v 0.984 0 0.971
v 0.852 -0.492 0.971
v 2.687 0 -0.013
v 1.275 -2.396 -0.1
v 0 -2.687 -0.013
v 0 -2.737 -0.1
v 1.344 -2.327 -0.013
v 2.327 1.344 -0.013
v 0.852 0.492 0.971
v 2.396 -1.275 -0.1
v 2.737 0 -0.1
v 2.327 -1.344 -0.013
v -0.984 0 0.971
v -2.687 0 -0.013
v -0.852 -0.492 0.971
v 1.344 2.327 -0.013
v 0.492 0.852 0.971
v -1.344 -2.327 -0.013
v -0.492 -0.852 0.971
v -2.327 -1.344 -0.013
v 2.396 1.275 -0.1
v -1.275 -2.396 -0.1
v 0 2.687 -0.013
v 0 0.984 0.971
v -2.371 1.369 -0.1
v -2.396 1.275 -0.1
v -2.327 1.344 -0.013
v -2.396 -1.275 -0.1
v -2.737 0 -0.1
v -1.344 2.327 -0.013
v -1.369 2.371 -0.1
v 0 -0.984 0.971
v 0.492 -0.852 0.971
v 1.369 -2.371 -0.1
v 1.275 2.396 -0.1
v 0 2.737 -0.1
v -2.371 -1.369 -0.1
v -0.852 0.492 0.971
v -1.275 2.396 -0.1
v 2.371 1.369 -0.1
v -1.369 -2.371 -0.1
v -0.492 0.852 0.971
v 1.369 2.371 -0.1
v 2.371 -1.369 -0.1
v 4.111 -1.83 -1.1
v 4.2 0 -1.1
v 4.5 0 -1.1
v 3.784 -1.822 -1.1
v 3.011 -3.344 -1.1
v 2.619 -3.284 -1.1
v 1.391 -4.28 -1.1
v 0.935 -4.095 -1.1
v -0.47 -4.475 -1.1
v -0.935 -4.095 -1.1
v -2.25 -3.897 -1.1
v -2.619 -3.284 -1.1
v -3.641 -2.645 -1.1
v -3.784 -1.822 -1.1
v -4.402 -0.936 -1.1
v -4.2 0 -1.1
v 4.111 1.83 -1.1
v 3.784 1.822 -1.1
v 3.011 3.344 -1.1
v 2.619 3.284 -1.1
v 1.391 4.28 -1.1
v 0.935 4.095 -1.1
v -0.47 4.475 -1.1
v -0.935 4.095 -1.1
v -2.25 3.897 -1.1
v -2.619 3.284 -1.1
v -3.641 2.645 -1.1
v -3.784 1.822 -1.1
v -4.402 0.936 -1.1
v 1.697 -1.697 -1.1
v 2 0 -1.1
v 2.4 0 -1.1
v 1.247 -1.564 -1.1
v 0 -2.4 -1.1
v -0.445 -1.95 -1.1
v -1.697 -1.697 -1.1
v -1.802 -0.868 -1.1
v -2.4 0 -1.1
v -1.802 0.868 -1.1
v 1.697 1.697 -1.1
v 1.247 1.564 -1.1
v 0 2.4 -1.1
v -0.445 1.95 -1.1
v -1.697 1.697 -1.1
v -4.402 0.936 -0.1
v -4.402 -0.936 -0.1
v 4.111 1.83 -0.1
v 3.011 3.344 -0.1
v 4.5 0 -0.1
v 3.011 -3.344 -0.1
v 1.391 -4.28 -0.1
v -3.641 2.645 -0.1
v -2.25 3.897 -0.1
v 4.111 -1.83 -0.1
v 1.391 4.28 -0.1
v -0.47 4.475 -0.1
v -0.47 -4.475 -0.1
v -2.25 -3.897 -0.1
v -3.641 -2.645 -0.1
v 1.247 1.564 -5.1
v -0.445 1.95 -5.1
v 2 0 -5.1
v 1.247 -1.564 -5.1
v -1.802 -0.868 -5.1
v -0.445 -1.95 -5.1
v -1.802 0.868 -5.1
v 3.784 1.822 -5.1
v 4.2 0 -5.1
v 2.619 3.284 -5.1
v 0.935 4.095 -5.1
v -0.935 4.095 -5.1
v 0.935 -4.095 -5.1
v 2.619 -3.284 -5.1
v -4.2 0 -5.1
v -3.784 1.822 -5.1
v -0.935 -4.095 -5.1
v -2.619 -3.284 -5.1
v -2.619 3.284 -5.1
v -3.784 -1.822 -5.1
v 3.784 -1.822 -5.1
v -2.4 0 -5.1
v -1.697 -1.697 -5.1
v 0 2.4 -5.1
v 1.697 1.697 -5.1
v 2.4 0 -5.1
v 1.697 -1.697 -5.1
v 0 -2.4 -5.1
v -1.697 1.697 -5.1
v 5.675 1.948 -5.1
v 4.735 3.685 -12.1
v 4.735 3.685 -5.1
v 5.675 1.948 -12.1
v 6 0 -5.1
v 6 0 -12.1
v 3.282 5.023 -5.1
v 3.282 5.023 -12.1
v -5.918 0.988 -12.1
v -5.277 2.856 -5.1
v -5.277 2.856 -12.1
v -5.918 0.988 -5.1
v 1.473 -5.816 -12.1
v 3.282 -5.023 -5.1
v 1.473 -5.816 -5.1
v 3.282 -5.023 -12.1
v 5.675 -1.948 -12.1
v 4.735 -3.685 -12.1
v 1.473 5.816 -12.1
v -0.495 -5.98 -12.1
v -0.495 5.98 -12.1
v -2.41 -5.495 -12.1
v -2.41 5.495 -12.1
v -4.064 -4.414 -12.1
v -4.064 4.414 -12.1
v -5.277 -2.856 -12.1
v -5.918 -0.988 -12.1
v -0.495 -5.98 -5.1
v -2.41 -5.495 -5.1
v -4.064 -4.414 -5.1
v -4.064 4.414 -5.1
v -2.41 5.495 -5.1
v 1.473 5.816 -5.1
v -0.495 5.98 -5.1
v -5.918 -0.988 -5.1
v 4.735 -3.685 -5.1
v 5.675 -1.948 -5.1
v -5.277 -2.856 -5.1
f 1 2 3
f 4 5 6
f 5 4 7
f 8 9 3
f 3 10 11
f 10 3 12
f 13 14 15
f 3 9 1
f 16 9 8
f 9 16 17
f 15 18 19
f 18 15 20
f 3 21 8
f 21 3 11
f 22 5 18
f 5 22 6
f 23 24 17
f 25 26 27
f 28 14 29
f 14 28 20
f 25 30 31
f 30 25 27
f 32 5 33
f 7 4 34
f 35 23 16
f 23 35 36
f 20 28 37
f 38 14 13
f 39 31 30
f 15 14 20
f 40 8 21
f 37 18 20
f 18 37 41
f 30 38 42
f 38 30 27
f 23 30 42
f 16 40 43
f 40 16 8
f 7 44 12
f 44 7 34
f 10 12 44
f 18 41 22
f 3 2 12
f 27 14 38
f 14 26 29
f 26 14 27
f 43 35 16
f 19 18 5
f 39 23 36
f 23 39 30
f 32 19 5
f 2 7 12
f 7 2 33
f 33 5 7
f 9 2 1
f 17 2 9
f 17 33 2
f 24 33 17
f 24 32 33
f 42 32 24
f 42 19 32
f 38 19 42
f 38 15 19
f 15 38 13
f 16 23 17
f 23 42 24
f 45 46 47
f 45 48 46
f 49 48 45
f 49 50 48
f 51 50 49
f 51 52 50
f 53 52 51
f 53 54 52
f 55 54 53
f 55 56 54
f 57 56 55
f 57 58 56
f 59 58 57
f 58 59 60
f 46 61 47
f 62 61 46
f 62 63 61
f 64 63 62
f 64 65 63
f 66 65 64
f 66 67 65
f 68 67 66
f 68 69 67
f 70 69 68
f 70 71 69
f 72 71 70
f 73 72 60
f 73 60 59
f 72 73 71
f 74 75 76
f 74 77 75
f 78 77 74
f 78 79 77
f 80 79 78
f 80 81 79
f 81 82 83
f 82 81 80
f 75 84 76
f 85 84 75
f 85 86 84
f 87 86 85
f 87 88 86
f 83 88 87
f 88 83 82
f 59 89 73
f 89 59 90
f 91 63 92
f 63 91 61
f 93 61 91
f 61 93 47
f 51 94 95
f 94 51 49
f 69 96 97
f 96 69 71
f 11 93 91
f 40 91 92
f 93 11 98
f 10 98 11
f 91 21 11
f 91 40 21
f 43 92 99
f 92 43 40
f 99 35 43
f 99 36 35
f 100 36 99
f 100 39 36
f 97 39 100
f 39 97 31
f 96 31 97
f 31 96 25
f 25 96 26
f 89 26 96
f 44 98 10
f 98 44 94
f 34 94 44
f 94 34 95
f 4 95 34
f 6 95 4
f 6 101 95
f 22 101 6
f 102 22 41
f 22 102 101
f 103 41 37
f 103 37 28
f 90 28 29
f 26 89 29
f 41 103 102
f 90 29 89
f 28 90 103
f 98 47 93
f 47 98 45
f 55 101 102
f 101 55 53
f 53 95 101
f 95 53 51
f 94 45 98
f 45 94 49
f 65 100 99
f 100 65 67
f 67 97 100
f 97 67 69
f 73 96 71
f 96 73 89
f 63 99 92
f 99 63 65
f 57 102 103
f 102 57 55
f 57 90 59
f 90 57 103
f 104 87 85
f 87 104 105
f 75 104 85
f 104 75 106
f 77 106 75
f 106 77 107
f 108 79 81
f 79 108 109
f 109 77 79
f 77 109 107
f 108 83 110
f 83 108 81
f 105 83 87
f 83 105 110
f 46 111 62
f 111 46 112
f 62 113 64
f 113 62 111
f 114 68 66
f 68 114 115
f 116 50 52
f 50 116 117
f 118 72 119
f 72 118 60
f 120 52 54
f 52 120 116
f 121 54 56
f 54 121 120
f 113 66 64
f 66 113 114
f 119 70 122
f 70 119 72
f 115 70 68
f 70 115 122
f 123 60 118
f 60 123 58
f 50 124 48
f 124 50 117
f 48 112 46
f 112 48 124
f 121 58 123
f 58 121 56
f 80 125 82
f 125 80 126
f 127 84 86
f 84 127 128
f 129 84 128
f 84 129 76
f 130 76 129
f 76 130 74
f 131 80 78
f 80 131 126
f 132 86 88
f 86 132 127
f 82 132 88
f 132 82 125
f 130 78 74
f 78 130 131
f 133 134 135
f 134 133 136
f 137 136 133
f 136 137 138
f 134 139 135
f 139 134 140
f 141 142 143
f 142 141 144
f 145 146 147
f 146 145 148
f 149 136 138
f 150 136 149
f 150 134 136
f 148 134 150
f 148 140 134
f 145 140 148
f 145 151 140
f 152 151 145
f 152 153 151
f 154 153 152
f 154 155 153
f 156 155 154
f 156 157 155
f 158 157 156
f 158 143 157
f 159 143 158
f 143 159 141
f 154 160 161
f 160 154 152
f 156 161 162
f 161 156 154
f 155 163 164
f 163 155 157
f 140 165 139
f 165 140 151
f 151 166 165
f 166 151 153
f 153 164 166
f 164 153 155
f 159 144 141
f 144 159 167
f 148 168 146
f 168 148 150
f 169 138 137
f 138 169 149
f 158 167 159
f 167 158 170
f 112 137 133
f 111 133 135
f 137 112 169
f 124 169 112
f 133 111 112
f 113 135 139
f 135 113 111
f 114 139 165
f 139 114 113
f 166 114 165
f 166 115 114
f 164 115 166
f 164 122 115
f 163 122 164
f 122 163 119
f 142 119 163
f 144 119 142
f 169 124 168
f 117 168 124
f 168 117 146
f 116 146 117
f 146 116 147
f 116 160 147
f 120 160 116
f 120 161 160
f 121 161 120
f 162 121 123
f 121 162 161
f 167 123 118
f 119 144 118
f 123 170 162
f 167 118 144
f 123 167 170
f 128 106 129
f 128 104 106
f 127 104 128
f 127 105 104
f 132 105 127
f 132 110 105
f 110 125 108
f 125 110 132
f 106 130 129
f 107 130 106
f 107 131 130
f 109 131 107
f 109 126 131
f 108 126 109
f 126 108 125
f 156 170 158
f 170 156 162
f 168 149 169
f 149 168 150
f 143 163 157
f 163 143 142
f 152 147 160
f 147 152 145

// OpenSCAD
// Parameters
thread_diameter = 4; //[2:8:0.1]
length = 10; //[5:20:0.5]
head_diameter = 7.6; //[3.8:15.2:0.1]
head_height = 2.2; //[1.1:4.4:0.1]
overlap = 1; //[0.5:2:0.1]
washer_outer_diameter = 9; //[5:18:0.1]
washer_thickness = 1; //[0.5:2:0.1]
spacer_height = 6; //[3:12:0.5]
spacer_wall = 1.8; //[0.9:3.6:0.1]
spacer_clearance = 0.4; //[0.2:0.8:0.05]
buzzer_diameter = 12; //[6:24:0.5]
buzzer_height = 7; //[3.5:14:0.5]

// Derived Z layout (all solids centered on Z=0 head mid-plane)
shaft_h = length - head_height;

// Head spans: z in [-head_height/2, +head_height/2]
z_head_center   = 0;

// Shaft should start slightly inside head to guarantee union
// Shaft top at z = -head_height/2 + overlap
z_shaft_center  = (-head_height/2 + overlap) - shaft_h/2;

// Washer sits under head and overlaps into head by 'overlap'
z_washer_center = (-head_height/2 - washer_thickness/2 + overlap);

// Spacer sits under washer and overlaps into washer by 'overlap'
z_spacer_center = (z_washer_center - washer_thickness/2) - spacer_height/2 + overlap;

// Buzzer sits under spacer and overlaps into spacer by 'overlap'
z_buzzer_center = (z_spacer_center - spacer_height/2) - buzzer_height/2 + overlap;

// Screw and Washer - connected geometry
module screw_and_washer() {
  color("DimGray")
  union() {
    // Threaded Shaft (overlaps into head)
    translate([0, 0, z_shaft_center])
      cylinder(h=shaft_h, r=thread_diameter/2, center=true);

    // Dome Head
    intersection() {
      translate([0, 0, head_height/2 - head_diameter/2])
        sphere(r=head_diameter/2, center=true);
      translate([0, 0, z_head_center])
        cube([head_diameter, head_diameter, head_height], center=true);
    }

    // Washer (overlaps into head)
    difference() {
      translate([0, 0, z_washer_center])
        cylinder(h=washer_thickness, r=washer_outer_diameter/2, center=true);
      translate([0, 0, z_washer_center])
        cylinder(h=washer_thickness + 2*overlap, r=thread_diameter/2 + spacer_clearance, center=true);
    }
  }
}

// PCB Spacer - connected to washer
module pcb_spacer() {
  color("Silver")
  difference() {
    translate([0, 0, z_spacer_center])
      cylinder(h=spacer_height, r=thread_diameter/2 + spacer_clearance + spacer_wall, center=true);
    translate([0, 0, z_spacer_center])
      cylinder(h=spacer_height + 2*overlap, r=thread_diameter/2 + spacer_clearance, center=true);
  }
}

// Buzzer - connected to spacer (no floating)
module buzzer() {
  color("Black")
  translate([0, 0, z_buzzer_center])
    cylinder(h=buzzer_height, r=buzzer_diameter/2, center=true);
}

// Assembly: single connected solid
module assembly() {
  union() {
    screw_and_washer();
    pcb_spacer();
    buzzer();
  }
}

assembly();
